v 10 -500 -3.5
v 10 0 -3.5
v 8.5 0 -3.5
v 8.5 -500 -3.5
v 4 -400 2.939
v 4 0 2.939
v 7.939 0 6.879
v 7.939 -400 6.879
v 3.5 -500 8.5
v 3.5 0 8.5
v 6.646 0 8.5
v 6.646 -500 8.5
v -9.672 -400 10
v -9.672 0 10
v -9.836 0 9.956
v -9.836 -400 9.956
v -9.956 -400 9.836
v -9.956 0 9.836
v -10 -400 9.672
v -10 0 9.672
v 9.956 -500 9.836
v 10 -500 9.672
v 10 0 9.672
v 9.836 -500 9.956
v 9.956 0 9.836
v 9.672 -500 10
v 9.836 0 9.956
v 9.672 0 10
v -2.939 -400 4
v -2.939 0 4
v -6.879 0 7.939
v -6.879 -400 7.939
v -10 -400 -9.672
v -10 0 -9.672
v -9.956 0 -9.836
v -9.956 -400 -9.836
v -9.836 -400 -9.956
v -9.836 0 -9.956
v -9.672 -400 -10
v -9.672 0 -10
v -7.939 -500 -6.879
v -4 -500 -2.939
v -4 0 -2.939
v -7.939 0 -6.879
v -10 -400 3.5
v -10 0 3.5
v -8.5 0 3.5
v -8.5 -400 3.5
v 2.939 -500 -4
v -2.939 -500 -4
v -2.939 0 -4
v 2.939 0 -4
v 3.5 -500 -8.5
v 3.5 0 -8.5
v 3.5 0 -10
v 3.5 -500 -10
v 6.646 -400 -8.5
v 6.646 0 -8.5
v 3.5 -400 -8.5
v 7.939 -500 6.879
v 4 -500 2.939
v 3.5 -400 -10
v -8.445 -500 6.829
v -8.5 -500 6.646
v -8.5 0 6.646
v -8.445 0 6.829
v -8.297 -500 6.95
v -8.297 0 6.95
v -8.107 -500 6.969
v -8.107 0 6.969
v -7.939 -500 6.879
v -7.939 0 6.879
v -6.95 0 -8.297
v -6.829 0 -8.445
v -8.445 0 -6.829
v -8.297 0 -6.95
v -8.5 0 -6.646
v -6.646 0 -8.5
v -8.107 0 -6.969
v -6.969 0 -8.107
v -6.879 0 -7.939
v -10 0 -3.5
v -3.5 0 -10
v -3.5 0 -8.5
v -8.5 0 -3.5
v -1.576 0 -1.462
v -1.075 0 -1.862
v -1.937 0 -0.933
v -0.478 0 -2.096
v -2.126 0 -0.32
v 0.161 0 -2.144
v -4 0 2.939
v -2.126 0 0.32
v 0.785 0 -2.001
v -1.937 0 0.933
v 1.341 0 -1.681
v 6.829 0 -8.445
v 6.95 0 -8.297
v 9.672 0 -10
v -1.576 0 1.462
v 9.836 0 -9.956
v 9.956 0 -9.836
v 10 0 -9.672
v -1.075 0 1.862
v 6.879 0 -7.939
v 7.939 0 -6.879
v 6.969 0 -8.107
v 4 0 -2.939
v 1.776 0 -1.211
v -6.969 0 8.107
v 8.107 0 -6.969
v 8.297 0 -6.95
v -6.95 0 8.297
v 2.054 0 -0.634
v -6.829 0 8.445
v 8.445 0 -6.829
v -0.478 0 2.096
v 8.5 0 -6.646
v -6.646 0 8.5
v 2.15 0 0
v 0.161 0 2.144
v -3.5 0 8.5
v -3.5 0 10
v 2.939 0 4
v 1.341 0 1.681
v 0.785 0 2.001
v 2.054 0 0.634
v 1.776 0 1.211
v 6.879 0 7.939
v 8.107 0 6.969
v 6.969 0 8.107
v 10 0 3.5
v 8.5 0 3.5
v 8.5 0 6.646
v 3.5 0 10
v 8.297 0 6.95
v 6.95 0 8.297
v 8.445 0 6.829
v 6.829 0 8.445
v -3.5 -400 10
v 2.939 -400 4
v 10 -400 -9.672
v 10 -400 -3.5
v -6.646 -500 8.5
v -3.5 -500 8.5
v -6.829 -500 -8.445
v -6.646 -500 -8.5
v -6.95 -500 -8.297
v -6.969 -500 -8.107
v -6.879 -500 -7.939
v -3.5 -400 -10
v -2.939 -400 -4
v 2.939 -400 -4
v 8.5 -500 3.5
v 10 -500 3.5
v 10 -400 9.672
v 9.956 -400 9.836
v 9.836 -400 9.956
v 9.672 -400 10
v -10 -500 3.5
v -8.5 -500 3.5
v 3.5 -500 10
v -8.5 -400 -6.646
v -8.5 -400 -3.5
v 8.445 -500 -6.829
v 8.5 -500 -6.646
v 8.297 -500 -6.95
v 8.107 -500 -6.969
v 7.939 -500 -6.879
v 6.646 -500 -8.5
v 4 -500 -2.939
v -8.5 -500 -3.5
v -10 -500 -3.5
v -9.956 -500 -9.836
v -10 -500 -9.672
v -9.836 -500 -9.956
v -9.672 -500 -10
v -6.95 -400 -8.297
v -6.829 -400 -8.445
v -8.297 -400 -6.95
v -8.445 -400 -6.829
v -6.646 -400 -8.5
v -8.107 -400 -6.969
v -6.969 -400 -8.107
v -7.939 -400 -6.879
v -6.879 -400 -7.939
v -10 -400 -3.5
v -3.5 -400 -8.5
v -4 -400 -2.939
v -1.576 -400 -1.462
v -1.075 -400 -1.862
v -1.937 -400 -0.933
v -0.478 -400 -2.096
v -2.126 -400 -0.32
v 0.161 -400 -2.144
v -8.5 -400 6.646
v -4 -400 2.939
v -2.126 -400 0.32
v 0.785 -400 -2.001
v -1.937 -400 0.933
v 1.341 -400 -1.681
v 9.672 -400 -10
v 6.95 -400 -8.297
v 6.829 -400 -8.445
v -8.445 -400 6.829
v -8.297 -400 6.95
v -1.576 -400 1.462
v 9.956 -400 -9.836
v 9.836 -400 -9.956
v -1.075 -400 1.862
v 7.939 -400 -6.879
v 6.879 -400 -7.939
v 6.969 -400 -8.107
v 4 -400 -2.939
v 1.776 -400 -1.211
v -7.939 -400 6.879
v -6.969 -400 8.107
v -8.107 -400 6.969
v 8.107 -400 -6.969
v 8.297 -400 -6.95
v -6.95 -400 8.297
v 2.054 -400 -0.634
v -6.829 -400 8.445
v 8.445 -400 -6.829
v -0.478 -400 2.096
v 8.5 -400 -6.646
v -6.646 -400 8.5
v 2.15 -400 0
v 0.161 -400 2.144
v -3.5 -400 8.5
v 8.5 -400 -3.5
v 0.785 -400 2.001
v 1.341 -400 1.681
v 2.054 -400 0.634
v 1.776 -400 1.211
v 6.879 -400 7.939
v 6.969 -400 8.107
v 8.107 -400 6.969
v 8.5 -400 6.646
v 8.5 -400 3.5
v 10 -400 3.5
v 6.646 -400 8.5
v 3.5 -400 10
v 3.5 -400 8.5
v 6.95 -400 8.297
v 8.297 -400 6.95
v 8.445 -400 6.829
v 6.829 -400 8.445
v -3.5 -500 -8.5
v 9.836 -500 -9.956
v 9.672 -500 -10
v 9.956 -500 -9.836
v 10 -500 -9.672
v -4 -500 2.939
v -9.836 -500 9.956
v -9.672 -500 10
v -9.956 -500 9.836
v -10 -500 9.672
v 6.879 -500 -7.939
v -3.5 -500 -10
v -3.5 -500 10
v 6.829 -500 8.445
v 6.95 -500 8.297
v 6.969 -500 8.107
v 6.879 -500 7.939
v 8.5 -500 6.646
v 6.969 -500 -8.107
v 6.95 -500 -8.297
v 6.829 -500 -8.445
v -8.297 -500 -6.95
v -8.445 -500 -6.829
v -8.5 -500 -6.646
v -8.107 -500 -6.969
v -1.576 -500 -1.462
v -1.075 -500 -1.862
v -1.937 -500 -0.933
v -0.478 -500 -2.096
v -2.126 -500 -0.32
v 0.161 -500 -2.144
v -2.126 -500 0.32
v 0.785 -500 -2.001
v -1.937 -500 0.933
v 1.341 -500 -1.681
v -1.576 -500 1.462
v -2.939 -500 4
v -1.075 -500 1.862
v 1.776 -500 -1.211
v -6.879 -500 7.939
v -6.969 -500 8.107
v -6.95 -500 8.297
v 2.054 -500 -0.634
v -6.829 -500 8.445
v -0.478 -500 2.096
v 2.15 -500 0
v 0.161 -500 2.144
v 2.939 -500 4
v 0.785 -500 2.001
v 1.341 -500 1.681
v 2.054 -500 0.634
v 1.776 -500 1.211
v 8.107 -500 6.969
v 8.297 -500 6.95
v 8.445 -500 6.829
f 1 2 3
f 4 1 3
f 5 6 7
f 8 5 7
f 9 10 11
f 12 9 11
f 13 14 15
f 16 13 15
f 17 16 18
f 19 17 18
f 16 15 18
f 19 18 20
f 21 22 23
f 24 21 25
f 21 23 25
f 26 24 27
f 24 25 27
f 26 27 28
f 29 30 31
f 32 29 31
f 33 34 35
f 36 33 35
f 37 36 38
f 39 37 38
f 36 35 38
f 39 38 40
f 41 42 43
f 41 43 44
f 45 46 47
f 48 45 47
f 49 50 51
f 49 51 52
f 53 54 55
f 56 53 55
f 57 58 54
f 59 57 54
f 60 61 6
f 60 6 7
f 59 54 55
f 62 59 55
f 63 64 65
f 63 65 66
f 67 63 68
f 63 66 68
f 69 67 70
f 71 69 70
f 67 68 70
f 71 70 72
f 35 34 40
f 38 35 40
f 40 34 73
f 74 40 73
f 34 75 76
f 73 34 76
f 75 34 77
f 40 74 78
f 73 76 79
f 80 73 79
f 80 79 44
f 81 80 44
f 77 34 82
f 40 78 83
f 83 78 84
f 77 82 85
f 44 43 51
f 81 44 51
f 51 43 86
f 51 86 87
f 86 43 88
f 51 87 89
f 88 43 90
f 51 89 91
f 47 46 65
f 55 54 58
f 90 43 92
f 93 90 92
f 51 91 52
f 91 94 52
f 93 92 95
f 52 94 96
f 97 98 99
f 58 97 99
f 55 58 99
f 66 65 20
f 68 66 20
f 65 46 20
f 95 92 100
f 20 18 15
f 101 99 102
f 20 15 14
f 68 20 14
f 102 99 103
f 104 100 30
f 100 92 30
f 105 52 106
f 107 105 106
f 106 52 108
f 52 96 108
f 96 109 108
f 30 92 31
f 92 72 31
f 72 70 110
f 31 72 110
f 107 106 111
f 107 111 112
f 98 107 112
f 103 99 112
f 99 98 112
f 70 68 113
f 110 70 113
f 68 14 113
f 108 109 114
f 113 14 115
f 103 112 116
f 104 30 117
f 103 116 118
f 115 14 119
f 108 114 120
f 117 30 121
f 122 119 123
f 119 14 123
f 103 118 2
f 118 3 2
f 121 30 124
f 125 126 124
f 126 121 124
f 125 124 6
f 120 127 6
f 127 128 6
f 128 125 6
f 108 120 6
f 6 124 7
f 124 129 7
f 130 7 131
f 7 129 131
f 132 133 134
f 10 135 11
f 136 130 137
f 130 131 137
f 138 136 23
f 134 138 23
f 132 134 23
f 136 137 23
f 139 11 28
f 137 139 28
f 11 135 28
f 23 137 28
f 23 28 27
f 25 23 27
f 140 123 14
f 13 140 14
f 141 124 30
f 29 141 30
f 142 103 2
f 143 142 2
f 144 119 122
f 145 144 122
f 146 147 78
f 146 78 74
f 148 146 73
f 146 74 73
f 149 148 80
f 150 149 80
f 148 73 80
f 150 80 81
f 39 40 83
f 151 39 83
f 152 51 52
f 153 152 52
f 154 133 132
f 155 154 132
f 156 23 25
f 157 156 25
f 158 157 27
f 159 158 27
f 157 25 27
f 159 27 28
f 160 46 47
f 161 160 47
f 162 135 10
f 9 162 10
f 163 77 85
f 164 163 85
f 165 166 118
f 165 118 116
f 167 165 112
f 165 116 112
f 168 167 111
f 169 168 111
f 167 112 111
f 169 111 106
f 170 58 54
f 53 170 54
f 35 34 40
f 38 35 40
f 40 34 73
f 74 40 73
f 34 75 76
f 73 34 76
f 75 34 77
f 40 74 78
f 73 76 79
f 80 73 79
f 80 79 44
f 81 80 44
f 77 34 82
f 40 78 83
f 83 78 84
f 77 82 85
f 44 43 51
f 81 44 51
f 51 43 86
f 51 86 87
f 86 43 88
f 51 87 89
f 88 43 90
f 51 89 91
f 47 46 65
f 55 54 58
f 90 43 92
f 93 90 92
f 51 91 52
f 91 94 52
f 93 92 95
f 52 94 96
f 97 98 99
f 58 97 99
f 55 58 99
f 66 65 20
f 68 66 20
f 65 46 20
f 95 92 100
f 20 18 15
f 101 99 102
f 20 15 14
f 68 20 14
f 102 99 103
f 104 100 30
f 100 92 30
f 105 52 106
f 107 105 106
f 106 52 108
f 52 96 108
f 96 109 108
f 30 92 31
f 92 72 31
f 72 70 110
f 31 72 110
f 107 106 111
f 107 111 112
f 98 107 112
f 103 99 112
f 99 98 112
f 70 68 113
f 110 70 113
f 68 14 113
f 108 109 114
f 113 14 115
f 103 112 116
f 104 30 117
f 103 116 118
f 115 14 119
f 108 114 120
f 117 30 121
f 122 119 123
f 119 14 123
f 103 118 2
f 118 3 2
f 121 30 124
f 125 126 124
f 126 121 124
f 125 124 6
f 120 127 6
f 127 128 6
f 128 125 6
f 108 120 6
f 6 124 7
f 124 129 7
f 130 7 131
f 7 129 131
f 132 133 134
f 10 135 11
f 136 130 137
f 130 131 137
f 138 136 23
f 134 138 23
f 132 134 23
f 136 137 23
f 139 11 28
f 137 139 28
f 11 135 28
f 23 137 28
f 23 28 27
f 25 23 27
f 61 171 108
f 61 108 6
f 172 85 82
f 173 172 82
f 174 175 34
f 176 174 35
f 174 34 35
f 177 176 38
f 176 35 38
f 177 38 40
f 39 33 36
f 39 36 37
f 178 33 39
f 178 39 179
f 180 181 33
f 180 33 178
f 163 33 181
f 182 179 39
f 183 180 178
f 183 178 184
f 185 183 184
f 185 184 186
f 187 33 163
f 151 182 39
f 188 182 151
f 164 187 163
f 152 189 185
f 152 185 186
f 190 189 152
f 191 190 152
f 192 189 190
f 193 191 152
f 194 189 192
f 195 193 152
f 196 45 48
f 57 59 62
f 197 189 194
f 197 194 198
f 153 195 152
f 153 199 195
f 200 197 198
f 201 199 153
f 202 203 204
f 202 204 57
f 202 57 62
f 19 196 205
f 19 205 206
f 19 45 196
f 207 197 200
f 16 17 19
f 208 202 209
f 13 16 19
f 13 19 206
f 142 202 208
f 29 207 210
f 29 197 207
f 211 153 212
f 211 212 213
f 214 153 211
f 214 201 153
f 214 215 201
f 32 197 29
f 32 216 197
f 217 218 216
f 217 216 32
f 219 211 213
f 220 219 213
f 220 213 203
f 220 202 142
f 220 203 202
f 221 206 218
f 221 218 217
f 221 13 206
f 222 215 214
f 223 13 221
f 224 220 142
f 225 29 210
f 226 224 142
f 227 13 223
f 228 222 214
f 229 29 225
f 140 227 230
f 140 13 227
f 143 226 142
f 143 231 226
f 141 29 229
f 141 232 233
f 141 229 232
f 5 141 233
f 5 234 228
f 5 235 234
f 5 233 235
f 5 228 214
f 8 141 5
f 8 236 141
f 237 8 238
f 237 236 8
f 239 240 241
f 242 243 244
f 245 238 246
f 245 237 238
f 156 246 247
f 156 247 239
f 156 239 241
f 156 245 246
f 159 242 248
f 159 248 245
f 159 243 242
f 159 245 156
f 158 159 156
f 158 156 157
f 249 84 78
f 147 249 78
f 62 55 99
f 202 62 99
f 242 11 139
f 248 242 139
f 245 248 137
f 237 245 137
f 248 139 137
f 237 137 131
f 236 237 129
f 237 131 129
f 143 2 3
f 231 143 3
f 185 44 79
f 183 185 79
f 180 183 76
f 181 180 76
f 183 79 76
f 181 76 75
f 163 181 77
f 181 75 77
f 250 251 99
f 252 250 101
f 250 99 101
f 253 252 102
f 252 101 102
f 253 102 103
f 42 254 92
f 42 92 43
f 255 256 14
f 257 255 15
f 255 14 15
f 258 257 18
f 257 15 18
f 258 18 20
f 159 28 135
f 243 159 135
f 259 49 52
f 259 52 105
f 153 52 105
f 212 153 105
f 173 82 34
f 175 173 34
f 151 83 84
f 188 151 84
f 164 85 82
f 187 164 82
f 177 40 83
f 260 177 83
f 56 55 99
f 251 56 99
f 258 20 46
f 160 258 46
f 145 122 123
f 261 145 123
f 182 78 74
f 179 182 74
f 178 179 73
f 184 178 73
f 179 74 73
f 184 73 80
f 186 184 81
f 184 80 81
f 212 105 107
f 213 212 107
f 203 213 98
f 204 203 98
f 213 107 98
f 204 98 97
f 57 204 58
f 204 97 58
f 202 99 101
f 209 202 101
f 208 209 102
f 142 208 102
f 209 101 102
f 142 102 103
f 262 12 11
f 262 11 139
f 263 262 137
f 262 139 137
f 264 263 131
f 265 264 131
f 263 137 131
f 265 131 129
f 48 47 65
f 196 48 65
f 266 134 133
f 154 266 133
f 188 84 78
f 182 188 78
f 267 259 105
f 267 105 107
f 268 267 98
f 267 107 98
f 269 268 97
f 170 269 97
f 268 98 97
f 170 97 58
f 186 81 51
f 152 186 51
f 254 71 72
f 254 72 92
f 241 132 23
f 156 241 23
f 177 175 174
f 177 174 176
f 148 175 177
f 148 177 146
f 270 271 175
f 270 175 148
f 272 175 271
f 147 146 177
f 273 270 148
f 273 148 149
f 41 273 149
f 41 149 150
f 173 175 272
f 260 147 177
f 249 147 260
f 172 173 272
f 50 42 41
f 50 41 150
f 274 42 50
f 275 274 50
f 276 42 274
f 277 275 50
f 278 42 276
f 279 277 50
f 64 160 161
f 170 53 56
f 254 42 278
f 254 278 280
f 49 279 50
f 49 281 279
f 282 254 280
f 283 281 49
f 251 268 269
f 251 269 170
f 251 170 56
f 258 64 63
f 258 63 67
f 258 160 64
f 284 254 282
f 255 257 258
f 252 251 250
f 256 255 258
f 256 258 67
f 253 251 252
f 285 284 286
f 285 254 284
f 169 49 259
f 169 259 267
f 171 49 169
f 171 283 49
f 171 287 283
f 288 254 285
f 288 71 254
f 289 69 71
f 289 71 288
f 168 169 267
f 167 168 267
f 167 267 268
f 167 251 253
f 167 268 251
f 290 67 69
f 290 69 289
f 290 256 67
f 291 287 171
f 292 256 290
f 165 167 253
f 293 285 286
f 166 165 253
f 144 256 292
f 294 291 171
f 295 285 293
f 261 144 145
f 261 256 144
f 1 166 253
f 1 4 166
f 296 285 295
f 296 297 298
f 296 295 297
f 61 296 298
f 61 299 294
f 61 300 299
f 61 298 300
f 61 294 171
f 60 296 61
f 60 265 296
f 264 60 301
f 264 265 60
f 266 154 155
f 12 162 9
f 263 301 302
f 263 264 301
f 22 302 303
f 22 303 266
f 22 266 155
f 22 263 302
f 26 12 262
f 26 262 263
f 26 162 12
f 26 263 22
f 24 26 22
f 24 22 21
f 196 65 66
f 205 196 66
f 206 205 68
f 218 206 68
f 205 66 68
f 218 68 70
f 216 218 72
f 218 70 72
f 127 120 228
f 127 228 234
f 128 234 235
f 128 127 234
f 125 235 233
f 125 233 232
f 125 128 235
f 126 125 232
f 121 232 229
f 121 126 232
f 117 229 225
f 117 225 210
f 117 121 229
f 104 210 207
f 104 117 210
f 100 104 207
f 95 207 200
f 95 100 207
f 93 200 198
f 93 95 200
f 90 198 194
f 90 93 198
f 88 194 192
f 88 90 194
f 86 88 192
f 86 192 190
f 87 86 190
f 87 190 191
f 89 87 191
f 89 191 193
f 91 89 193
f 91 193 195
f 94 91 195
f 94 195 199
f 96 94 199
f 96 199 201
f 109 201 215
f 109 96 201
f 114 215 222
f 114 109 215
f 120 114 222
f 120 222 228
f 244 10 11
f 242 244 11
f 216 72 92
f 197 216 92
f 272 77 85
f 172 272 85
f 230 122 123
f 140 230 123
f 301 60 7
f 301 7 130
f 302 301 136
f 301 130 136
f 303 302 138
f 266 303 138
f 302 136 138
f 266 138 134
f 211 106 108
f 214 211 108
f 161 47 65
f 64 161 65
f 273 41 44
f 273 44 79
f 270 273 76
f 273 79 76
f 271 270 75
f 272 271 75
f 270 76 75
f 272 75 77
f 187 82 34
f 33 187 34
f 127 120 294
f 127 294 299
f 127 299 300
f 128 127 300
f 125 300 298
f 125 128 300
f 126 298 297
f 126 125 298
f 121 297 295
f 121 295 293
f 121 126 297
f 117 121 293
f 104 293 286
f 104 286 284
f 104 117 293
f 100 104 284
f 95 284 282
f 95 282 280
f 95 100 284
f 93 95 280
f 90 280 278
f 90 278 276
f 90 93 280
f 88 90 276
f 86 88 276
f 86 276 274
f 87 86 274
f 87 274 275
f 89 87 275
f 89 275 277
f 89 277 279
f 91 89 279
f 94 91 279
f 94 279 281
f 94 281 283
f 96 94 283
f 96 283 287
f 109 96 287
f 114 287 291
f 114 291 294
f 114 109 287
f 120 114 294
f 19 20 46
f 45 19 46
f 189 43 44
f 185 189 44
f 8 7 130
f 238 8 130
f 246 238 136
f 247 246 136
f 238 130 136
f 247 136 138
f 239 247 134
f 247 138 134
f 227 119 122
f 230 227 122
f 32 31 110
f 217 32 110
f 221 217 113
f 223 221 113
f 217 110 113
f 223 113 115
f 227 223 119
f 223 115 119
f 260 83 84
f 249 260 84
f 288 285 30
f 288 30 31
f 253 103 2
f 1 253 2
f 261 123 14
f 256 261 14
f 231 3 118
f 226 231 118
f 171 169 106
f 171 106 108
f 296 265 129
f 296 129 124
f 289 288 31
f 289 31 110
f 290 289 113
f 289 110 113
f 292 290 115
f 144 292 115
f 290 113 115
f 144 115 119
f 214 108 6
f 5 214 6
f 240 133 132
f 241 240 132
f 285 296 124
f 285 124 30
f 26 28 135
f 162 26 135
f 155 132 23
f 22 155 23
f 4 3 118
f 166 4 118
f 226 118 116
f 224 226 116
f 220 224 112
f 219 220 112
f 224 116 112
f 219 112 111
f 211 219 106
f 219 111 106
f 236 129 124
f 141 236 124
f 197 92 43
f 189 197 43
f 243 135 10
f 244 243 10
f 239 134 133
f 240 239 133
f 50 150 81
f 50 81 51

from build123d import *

# Parameters (mm, degrees)
F0_R     = 2.15
F1_DEPTH = 400
F2_DEPTH = 500


with BuildPart() as f1:
    # F0 (on Front) → F1 (new body)
    with BuildSketch(Plane.XZ):
        Polygon((4, 2.93934), (4, 4), (2.93934, 4), (-2.93934, 4), (-4, 4), (-4, 2.93934), (-4, -2.93934), (-4, -4), (-2.93934, -4), (2.93934, -4), (4, -4), (4, -2.93934), align=None)
        Circle(F0_R, mode=Mode.SUBTRACT)
        with BuildLine():
            Line((2.93934, 4), (4, 4))
            Line((4, 4), (4, 2.93934))
            Line((4, 2.93934), (7.939338, 6.878678))
            ThreePointArc((7.939338, 6.878678), (8.297256, 6.949873), (8.5, 6.646445))
            Line((8.5, 6.646445), (8.5, 3.5))
            Line((8.5, 3.5), (10, 3.5))
            Line((10, 3.5), (10, 9.671572))
            ThreePointArc((10, 9.671572), (9.903806, 9.903806), (9.671572, 10))
            Line((9.671572, 10), (3.5, 10))
            Line((3.5, 10), (3.5, 8.5))
            Line((3.5, 8.5), (6.646445, 8.5))
            ThreePointArc((6.646445, 8.5), (6.949873, 8.297256), (6.878678, 7.939338))
            Line((6.878678, 7.939338), (2.93934, 4))
        make_face()
        with BuildLine():
            Line((-4, 4), (-2.93934, 4))
            Line((-2.93934, 4), (-6.878678, 7.939338))
            ThreePointArc((-6.878678, 7.939338), (-6.949873, 8.297256), (-6.646445, 8.5))
            Line((-6.646445, 8.5), (-3.5, 8.5))
            Line((-3.5, 8.5), (-3.5, 10))
            Line((-3.5, 10), (-9.671572, 10))
            ThreePointArc((-9.671572, 10), (-9.903806, 9.903806), (-10, 9.671572))
            Line((-10, 9.671572), (-10, 3.5))
            Line((-10, 3.5), (-8.5, 3.5))
            Line((-8.5, 3.5), (-8.5, 6.646445))
            ThreePointArc((-8.5, 6.646445), (-8.297256, 6.949873), (-7.939338, 6.878678))
            Line((-7.939338, 6.878678), (-4, 2.93934))
            Line((-4, 2.93934), (-4, 4))
        make_face()
        with BuildLine():
            Line((7.939338, -6.878678), (4, -2.93934))
            Line((4, -2.93934), (4, -4))
            Line((4, -4), (2.93934, -4))
            Line((2.93934, -4), (6.878678, -7.939338))
            ThreePointArc((6.878678, -7.939338), (6.949873, -8.297256), (6.646445, -8.5))
            Line((6.646445, -8.5), (3.5, -8.5))
            Line((3.5, -8.5), (3.5, -10))
            Line((3.5, -10), (9.671572, -10))
            ThreePointArc((9.671572, -10), (9.903806, -9.903806), (10, -9.671572))
            Line((10, -9.671572), (10, -3.5))
            Line((10, -3.5), (8.5, -3.5))
            Line((8.5, -3.5), (8.5, -6.646445))
            ThreePointArc((8.5, -6.646445), (8.297256, -6.949873), (7.939338, -6.878678))
        make_face()
        with BuildLine():
            Line((-4, -4), (-4, -2.93934))
            Line((-4, -2.93934), (-7.939338, -6.878678))
            ThreePointArc((-7.939338, -6.878678), (-8.297256, -6.949873), (-8.5, -6.646445))
            Line((-8.5, -6.646445), (-8.5, -3.5))
            Line((-8.5, -3.5), (-10, -3.5))
            Line((-10, -3.5), (-10, -9.671572))
            ThreePointArc((-10, -9.671572), (-9.903806, -9.903806), (-9.671572, -10))
            Line((-9.671572, -10), (-3.5, -10))
            Line((-3.5, -10), (-3.5, -8.5))
            Line((-3.5, -8.5), (-6.646445, -8.5))
            ThreePointArc((-6.646445, -8.5), (-6.949873, -8.297256), (-6.878678, -7.939338))
            Line((-6.878678, -7.939338), (-2.93934, -4))
            Line((-2.93934, -4), (-4, -4))
        make_face()
    extrude(amount=F1_DEPTH)


with BuildPart() as f2:
    # F0 (on Front) → F2 (new body)
    with BuildSketch(Plane.XZ):
        Polygon((4, 2.93934), (4, 4), (2.93934, 4), (-2.93934, 4), (-4, 4), (-4, 2.93934), (-4, -2.93934), (-4, -4), (-2.93934, -4), (2.93934, -4), (4, -4), (4, -2.93934), align=None)
        Circle(F0_R, mode=Mode.SUBTRACT)
        with BuildLine():
            Line((2.93934, 4), (4, 4))
            Line((4, 4), (4, 2.93934))
            Line((4, 2.93934), (7.939338, 6.878678))
            ThreePointArc((7.939338, 6.878678), (8.297256, 6.949873), (8.5, 6.646445))
            Line((8.5, 6.646445), (8.5, 3.5))
            Line((8.5, 3.5), (10, 3.5))
            Line((10, 3.5), (10, 9.671572))
            ThreePointArc((10, 9.671572), (9.903806, 9.903806), (9.671572, 10))
            Line((9.671572, 10), (3.5, 10))
            Line((3.5, 10), (3.5, 8.5))
            Line((3.5, 8.5), (6.646445, 8.5))
            ThreePointArc((6.646445, 8.5), (6.949873, 8.297256), (6.878678, 7.939338))
            Line((6.878678, 7.939338), (2.93934, 4))
        make_face()
        with BuildLine():
            Line((-4, 4), (-2.93934, 4))
            Line((-2.93934, 4), (-6.878678, 7.939338))
            ThreePointArc((-6.878678, 7.939338), (-6.949873, 8.297256), (-6.646445, 8.5))
            Line((-6.646445, 8.5), (-3.5, 8.5))
            Line((-3.5, 8.5), (-3.5, 10))
            Line((-3.5, 10), (-9.671572, 10))
            ThreePointArc((-9.671572, 10), (-9.903806, 9.903806), (-10, 9.671572))
            Line((-10, 9.671572), (-10, 3.5))
            Line((-10, 3.5), (-8.5, 3.5))
            Line((-8.5, 3.5), (-8.5, 6.646445))
            ThreePointArc((-8.5, 6.646445), (-8.297256, 6.949873), (-7.939338, 6.878678))
            Line((-7.939338, 6.878678), (-4, 2.93934))
            Line((-4, 2.93934), (-4, 4))
        make_face()
        with BuildLine():
            Line((7.939338, -6.878678), (4, -2.93934))
            Line((4, -2.93934), (4, -4))
            Line((4, -4), (2.93934, -4))
            Line((2.93934, -4), (6.878678, -7.939338))
            ThreePointArc((6.878678, -7.939338), (6.949873, -8.297256), (6.646445, -8.5))
            Line((6.646445, -8.5), (3.5, -8.5))
            Line((3.5, -8.5), (3.5, -10))
            Line((3.5, -10), (9.671572, -10))
            ThreePointArc((9.671572, -10), (9.903806, -9.903806), (10, -9.671572))
            Line((10, -9.671572), (10, -3.5))
            Line((10, -3.5), (8.5, -3.5))
            Line((8.5, -3.5), (8.5, -6.646445))
            ThreePointArc((8.5, -6.646445), (8.297256, -6.949873), (7.939338, -6.878678))
        make_face()
        with BuildLine():
            Line((-4, -4), (-4, -2.93934))
            Line((-4, -2.93934), (-7.939338, -6.878678))
            ThreePointArc((-7.939338, -6.878678), (-8.297256, -6.949873), (-8.5, -6.646445))
            Line((-8.5, -6.646445), (-8.5, -3.5))
            Line((-8.5, -3.5), (-10, -3.5))
            Line((-10, -3.5), (-10, -9.671572))
            ThreePointArc((-10, -9.671572), (-9.903806, -9.903806), (-9.671572, -10))
            Line((-9.671572, -10), (-3.5, -10))
            Line((-3.5, -10), (-3.5, -8.5))
            Line((-3.5, -8.5), (-6.646445, -8.5))
            ThreePointArc((-6.646445, -8.5), (-6.949873, -8.297256), (-6.878678, -7.939338))
            Line((-6.878678, -7.939338), (-2.93934, -4))
            Line((-2.93934, -4), (-4, -4))
        make_face()
    extrude(amount=F2_DEPTH)


solid = Compound([f1.part, f2.part])
